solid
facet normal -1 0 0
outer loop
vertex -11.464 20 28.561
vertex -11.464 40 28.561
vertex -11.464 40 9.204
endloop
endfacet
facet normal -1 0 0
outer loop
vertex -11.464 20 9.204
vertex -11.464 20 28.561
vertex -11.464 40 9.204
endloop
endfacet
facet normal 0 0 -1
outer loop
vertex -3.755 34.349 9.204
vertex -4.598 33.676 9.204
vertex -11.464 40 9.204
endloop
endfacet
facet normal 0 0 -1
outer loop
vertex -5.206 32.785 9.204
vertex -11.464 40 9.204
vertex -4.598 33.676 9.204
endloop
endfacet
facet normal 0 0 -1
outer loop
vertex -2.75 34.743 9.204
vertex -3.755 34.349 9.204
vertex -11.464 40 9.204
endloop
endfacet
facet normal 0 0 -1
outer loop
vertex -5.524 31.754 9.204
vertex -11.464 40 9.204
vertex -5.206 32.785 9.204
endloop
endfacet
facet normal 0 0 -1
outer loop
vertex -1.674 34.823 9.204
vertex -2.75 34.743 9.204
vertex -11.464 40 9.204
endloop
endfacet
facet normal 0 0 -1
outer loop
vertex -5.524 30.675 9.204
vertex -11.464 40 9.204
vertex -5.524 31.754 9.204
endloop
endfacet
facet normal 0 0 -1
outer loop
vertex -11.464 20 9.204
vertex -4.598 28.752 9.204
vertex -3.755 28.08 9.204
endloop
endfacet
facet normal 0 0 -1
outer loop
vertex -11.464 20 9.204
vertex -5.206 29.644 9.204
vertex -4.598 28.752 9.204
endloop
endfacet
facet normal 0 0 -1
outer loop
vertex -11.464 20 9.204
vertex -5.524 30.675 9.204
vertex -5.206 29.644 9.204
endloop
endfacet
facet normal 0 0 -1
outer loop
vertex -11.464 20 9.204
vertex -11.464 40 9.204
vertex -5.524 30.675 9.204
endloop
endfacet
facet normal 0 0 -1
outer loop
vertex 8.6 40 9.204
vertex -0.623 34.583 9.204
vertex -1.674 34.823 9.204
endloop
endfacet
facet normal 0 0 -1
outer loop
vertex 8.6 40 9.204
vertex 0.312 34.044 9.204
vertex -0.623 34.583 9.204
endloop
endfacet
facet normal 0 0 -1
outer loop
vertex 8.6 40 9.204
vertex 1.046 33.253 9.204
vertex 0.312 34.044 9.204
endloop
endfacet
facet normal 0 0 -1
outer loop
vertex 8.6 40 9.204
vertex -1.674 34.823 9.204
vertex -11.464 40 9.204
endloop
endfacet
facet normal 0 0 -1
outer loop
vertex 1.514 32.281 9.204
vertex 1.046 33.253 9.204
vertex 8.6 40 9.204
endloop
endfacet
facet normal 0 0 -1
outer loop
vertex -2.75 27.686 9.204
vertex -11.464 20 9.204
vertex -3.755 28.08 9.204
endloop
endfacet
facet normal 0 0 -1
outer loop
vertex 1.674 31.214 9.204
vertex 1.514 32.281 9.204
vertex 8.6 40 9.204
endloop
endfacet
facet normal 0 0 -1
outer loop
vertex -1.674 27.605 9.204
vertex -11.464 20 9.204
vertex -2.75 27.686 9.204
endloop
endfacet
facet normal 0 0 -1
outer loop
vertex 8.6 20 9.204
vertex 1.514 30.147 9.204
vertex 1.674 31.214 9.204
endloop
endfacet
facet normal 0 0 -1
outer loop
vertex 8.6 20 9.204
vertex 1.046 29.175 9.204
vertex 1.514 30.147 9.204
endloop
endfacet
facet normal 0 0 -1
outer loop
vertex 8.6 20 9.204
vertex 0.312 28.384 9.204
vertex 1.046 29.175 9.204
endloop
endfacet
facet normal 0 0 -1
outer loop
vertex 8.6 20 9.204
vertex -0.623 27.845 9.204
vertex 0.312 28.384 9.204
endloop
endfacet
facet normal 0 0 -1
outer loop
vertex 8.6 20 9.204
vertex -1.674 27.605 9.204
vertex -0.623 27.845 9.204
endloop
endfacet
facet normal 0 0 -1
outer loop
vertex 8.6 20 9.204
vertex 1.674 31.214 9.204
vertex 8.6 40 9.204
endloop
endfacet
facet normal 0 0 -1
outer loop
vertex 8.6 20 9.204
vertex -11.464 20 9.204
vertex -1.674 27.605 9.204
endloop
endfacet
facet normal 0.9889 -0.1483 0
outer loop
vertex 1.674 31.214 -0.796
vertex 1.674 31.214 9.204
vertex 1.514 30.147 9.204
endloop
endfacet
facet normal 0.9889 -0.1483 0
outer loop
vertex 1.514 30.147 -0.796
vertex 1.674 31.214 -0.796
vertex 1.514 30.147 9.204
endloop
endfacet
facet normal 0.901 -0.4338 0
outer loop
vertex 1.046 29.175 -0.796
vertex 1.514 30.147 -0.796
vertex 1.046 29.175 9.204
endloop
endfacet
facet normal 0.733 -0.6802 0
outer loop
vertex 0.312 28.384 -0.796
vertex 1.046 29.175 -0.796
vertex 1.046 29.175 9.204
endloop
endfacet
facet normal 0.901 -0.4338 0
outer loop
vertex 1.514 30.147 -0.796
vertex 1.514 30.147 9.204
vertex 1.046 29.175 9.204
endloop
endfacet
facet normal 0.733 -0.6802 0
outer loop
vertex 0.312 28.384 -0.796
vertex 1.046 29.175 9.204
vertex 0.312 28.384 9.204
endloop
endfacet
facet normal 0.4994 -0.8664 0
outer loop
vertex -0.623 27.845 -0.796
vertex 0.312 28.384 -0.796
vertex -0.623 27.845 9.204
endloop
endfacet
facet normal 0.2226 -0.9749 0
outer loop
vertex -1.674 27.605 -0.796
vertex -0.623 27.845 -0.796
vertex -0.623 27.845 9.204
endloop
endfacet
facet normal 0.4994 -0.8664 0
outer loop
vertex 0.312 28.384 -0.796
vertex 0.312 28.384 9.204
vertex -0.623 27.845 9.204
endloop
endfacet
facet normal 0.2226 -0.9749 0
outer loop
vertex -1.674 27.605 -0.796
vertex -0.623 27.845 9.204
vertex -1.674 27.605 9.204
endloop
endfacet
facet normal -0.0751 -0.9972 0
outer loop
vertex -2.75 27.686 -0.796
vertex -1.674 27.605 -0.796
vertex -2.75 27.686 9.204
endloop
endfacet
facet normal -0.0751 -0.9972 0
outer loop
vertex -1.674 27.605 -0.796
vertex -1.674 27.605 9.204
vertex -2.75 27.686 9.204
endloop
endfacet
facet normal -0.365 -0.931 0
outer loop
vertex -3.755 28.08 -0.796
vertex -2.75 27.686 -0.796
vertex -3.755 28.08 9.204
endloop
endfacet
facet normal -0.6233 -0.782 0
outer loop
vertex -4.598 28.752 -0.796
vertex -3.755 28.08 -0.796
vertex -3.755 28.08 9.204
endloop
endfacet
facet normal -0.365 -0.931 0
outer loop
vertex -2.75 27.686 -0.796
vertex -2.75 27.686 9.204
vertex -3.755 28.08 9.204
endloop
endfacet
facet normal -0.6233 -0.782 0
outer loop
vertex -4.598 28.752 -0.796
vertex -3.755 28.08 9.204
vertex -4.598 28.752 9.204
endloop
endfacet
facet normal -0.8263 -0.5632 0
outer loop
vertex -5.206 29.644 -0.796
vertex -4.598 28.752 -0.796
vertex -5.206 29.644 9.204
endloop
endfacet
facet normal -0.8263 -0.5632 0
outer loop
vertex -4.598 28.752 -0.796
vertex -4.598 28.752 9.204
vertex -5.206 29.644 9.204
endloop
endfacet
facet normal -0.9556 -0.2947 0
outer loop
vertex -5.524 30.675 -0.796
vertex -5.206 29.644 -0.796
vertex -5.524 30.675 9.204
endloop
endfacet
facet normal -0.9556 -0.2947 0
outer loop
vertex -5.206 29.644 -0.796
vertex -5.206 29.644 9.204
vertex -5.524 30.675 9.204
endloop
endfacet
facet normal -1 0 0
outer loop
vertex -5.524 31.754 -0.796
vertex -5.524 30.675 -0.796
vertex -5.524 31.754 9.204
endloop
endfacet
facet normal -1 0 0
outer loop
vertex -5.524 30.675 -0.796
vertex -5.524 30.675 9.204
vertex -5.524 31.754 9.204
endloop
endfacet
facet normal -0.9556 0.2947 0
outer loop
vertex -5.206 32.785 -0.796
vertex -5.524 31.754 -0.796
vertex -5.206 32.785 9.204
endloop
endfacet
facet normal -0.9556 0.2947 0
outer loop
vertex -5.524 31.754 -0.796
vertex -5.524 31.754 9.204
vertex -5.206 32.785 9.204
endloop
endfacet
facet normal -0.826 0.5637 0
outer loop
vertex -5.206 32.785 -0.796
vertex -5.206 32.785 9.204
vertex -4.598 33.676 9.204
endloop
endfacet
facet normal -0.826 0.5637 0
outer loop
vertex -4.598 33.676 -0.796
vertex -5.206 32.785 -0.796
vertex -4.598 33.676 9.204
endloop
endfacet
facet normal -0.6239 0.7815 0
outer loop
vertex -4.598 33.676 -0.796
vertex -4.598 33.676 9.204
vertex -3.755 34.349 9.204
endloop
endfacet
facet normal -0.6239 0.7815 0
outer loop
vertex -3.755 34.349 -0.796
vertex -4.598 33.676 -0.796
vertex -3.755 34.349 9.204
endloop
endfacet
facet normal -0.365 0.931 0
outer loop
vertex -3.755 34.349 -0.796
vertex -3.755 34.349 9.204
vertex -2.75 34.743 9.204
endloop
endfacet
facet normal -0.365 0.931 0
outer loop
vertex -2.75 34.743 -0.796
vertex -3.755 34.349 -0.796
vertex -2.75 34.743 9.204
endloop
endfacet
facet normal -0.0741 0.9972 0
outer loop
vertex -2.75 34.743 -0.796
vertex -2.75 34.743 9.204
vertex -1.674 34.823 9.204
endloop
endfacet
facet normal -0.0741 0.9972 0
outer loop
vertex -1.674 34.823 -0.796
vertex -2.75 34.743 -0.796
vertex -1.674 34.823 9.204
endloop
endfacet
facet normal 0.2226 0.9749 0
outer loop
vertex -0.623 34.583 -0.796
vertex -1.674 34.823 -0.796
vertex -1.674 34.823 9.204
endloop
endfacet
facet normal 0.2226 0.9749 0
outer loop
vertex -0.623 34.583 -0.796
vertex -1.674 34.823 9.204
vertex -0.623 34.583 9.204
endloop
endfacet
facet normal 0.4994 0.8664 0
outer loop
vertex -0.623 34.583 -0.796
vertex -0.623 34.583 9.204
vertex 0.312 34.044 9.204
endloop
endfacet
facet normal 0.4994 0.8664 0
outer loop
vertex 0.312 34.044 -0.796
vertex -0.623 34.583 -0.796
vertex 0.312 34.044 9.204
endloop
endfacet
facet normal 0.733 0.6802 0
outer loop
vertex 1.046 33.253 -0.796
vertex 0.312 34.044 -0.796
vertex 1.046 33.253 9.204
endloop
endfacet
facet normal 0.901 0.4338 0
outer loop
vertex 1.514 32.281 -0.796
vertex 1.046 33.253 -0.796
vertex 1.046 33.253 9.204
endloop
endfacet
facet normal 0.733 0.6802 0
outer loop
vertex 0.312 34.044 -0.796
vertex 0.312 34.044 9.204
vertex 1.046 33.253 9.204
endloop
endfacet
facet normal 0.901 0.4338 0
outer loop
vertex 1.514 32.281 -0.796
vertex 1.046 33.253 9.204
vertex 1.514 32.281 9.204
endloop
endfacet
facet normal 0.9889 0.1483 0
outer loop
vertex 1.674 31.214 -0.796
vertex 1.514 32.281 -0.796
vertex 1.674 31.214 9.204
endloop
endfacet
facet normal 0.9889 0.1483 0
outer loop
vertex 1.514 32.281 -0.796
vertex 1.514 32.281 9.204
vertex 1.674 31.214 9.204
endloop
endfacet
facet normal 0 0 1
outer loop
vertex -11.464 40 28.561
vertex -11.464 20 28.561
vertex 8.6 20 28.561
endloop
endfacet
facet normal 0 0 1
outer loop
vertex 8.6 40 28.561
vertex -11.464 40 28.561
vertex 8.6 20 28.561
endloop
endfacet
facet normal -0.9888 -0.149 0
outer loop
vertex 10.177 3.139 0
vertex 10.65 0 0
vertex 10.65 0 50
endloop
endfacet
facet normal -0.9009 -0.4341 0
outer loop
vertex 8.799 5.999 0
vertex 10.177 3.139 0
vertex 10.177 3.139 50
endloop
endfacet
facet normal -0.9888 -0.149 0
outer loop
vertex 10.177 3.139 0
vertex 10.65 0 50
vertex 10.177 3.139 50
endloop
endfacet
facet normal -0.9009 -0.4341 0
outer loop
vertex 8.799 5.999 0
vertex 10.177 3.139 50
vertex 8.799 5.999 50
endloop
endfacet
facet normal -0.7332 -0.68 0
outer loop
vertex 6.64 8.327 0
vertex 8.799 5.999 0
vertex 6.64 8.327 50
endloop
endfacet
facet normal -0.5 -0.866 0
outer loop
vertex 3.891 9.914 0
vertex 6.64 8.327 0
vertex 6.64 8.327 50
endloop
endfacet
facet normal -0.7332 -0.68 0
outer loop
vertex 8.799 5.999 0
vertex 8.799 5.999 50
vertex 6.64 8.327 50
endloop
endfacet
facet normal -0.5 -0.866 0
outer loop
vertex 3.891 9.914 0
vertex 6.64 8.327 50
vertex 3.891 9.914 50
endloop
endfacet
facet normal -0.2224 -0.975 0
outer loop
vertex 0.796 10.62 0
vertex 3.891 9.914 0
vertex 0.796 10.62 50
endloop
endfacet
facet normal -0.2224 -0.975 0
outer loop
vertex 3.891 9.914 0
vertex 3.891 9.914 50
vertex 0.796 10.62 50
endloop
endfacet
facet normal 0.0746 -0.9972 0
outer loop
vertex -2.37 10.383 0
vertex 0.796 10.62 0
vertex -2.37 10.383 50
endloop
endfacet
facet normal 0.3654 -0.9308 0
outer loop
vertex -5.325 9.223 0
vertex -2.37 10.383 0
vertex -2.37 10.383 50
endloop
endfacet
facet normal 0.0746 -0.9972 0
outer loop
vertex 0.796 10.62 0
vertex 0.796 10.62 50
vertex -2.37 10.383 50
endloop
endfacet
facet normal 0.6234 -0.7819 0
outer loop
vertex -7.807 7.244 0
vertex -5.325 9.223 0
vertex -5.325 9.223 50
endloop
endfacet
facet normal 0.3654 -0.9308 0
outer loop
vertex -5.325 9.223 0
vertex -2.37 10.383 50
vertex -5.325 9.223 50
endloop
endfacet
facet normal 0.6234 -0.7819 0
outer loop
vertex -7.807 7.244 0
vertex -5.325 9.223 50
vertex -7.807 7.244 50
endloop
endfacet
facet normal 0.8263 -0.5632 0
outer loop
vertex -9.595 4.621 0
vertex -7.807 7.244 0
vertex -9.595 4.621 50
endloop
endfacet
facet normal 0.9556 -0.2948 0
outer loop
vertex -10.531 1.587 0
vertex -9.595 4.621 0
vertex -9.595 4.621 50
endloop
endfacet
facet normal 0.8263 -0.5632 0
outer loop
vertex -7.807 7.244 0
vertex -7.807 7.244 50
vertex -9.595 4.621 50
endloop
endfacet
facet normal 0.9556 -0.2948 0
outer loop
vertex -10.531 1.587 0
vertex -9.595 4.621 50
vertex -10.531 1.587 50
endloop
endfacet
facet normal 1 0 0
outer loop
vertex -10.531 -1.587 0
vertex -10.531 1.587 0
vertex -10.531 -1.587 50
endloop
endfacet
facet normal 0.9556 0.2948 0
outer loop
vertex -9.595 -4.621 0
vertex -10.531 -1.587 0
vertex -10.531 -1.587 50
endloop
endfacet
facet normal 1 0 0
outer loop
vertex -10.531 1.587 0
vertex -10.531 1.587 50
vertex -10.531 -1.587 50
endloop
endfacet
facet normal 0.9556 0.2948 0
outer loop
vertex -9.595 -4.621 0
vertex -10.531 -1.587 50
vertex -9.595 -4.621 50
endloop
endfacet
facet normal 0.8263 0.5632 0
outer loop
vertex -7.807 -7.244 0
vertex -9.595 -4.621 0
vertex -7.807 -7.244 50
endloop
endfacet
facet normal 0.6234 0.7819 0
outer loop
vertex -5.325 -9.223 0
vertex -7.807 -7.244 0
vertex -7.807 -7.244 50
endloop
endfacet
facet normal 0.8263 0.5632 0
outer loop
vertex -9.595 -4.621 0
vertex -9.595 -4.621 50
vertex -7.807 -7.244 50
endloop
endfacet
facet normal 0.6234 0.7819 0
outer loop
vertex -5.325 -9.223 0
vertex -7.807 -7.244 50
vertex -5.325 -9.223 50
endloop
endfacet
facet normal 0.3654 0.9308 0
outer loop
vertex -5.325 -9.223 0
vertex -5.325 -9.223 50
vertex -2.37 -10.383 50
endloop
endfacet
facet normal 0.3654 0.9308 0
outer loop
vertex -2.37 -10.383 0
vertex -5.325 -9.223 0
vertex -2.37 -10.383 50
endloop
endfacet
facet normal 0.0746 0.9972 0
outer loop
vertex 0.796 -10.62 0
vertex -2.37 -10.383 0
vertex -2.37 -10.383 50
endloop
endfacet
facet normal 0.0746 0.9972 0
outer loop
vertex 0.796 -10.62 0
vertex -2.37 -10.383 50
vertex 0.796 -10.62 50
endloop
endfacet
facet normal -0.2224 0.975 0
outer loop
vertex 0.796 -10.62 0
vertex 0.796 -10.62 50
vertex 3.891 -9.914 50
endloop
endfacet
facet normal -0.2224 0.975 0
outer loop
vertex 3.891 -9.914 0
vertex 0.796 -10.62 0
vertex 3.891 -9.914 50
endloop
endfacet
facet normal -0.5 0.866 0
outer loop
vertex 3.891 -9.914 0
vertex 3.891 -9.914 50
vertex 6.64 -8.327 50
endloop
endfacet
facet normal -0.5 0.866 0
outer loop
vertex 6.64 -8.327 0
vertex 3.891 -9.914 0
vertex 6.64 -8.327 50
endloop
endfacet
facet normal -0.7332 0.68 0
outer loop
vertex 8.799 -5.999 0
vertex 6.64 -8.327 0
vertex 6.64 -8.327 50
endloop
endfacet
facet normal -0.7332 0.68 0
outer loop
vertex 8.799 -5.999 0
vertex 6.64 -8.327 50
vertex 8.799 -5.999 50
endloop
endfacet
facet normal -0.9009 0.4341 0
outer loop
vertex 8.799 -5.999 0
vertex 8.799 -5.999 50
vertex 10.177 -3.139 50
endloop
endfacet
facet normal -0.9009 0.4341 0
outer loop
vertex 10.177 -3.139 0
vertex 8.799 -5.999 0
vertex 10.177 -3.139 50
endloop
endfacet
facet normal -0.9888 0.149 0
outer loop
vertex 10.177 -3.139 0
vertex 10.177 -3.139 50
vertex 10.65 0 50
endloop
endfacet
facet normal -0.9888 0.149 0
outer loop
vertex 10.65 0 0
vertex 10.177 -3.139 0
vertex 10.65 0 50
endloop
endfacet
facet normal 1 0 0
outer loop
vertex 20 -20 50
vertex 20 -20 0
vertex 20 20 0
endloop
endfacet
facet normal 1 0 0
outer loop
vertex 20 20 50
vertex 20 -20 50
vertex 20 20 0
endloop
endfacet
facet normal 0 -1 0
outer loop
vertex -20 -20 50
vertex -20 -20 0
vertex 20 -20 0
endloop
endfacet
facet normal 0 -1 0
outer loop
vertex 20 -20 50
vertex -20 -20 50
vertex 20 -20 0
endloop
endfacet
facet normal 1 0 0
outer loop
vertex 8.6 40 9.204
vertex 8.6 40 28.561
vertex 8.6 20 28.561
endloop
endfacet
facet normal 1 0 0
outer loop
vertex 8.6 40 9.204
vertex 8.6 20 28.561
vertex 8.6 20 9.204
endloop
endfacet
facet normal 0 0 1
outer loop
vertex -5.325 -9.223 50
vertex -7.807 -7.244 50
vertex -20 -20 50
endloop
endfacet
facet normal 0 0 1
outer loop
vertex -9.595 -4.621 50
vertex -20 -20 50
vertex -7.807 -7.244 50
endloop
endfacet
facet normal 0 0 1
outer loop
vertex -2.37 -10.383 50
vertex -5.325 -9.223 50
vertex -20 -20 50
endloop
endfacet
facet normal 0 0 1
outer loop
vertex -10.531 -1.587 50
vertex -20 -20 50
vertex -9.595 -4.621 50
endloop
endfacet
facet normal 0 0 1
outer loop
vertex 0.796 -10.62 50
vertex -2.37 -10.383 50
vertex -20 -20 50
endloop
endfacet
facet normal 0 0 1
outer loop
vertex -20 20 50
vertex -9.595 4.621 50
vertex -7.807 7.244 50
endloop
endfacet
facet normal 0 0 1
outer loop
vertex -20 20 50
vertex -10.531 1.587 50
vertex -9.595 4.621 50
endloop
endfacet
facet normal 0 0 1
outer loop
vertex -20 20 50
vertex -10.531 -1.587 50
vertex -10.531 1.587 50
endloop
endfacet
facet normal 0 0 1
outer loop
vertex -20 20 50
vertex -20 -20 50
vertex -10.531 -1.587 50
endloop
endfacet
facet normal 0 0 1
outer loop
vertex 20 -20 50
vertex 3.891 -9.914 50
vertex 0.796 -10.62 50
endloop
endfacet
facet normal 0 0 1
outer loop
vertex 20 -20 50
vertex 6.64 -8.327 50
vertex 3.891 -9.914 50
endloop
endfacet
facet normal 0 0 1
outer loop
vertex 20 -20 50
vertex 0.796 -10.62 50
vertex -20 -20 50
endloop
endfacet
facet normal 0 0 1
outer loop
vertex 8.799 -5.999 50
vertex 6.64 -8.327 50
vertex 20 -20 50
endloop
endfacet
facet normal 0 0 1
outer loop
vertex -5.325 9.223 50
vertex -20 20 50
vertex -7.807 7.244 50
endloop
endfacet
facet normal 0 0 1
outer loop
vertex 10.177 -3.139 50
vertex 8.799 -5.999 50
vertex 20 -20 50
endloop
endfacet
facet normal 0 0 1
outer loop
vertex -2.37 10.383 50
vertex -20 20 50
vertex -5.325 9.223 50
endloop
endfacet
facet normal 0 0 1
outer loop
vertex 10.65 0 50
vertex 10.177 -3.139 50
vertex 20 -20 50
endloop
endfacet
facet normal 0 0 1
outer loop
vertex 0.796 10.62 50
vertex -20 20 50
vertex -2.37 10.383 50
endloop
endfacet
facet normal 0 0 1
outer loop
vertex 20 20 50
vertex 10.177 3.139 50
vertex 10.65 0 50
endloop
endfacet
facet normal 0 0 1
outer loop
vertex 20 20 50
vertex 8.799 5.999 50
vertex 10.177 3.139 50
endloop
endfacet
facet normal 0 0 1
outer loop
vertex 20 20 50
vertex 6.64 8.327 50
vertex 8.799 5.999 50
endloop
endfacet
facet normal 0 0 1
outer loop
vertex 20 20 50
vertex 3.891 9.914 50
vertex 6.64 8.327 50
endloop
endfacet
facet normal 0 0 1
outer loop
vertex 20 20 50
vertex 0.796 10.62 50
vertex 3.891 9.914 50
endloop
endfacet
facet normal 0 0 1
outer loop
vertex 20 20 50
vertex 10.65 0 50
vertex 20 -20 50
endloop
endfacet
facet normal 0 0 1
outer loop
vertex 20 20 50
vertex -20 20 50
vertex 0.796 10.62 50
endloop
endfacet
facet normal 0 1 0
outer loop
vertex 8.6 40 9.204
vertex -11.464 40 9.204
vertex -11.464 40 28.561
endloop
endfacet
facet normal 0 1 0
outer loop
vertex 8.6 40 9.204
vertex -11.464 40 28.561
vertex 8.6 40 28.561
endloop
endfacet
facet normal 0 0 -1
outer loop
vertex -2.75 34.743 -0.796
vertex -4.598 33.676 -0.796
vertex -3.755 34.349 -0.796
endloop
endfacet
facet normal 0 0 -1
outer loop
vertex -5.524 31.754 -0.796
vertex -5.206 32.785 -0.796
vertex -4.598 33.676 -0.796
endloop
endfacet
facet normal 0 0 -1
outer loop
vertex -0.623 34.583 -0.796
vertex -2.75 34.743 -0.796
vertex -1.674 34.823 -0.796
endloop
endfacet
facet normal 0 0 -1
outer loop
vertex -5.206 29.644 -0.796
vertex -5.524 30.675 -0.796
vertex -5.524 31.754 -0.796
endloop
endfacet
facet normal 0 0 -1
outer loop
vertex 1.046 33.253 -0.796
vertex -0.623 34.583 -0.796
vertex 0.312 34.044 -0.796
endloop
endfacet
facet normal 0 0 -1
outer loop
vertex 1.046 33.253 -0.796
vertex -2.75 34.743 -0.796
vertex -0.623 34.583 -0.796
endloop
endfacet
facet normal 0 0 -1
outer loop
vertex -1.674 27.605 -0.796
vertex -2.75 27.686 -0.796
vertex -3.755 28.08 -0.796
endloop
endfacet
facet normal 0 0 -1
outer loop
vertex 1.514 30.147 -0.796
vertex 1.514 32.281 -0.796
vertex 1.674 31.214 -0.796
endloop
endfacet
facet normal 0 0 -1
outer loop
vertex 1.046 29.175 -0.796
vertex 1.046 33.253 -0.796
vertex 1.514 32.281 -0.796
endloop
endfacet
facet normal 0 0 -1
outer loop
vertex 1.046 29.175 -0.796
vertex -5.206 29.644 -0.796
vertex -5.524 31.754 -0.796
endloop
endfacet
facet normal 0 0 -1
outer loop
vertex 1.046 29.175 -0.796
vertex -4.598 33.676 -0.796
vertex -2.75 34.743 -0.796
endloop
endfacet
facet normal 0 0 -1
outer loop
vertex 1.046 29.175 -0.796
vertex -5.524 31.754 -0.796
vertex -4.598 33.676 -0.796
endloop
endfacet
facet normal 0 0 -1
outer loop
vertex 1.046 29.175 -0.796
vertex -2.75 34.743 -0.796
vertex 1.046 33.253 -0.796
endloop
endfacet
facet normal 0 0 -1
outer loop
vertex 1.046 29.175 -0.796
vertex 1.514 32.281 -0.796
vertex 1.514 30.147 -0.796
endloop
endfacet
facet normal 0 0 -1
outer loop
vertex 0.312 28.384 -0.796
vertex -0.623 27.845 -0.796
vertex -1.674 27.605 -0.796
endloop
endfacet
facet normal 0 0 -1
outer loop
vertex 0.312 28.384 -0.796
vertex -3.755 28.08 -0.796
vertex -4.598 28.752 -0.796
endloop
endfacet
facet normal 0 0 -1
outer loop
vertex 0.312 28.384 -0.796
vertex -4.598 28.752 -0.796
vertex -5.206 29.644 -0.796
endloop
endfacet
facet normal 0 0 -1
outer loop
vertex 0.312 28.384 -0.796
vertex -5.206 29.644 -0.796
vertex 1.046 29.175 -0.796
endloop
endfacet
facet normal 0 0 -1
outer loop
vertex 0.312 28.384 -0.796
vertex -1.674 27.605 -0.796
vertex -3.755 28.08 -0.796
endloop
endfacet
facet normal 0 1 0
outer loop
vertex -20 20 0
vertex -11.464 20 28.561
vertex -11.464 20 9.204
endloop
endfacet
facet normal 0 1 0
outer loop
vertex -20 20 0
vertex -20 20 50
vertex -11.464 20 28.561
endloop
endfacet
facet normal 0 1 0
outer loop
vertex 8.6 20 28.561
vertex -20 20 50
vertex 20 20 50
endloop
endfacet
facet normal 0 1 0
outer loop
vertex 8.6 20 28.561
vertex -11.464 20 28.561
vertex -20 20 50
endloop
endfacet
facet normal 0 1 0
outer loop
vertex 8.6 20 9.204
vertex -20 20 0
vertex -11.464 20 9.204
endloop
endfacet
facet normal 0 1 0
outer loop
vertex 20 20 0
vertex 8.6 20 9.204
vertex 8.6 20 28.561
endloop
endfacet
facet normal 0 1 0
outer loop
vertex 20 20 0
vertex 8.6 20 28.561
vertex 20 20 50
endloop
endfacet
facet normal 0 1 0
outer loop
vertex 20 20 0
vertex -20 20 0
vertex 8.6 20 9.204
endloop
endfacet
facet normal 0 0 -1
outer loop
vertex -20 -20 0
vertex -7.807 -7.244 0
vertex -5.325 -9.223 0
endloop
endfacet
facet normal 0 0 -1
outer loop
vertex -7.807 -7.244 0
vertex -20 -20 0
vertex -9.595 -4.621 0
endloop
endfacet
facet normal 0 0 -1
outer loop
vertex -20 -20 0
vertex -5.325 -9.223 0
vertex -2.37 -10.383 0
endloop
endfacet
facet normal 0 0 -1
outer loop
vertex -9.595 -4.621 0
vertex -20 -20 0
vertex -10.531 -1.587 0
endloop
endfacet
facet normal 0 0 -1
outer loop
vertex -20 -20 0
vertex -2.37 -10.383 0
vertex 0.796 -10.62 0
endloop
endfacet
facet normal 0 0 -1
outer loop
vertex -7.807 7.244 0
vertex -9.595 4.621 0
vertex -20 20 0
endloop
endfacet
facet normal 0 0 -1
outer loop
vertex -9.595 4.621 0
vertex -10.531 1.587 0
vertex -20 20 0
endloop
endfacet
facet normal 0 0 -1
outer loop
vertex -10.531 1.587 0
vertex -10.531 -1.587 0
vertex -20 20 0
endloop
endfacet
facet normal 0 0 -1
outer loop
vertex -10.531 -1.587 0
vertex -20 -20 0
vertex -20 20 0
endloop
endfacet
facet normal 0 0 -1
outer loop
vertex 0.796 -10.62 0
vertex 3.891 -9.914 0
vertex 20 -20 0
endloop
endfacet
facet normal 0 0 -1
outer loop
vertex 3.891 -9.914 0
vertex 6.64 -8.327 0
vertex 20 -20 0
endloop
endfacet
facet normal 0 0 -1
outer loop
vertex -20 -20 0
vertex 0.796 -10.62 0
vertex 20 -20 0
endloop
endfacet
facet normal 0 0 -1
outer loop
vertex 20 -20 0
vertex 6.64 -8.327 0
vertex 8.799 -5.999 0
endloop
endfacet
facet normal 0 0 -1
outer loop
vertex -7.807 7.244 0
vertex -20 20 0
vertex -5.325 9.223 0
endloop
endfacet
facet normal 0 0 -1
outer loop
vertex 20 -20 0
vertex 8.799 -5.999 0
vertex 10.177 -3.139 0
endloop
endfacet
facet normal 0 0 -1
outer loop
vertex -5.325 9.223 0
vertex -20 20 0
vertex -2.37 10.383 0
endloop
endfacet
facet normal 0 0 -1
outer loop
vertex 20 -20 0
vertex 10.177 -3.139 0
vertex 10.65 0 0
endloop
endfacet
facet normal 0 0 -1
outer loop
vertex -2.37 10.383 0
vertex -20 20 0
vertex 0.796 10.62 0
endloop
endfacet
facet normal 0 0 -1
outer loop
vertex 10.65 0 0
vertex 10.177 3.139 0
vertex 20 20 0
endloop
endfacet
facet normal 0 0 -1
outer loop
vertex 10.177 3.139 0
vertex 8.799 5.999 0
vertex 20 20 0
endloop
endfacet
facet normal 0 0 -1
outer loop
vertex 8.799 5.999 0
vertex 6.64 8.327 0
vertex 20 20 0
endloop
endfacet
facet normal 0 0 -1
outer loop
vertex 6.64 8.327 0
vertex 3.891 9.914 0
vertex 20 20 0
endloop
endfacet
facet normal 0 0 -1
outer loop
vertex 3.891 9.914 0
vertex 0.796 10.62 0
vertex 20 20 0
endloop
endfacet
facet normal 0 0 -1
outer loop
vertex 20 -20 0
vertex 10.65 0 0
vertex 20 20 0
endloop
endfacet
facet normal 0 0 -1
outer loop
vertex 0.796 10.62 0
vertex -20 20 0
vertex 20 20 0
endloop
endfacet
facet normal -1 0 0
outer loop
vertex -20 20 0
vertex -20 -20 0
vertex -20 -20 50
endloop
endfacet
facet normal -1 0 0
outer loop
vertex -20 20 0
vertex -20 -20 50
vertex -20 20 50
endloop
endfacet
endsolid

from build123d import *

# Parameters (mm, degrees)
SKETCH1_W           = 40
SKETCH1_H           = 40
BOSS_EXTRUDE1_DEPTH = 50
SKETCH2_R           = 10.65
CUT_EXTRUDE1_DEPTH  = 58.445626465
SKETCH3_W           = 20.063984789
SKETCH3_H           = 19.357087105
BOSS_EXTRUDE2_DEPTH = 20
SKETCH4_R           = 3.619370809
BOSS_EXTRUDE3_DEPTH = 10


with BuildPart() as part:
    # Sketch1 → Boss-Extrude1 (new body)
    with BuildSketch(Plane.XY):
        Rectangle(SKETCH1_W, SKETCH1_H)
    extrude(amount=BOSS_EXTRUDE1_DEPTH)

    # Sketch2 → Cut-Extrude1 (cut, through all)
    with BuildSketch(Plane.XY.offset(50)):
        Circle(SKETCH2_R)
    extrude(amount=-CUT_EXTRUDE1_DEPTH, mode=Mode.SUBTRACT)

    # Sketch3 → Boss-Extrude2 (add)
    with BuildSketch(Plane(origin=(0, 20, 0), x_dir=(1, 0, 0), z_dir=(0, 1, 0))):
        with Locations((-1.432326622, -18.882716681)):
            Rectangle(SKETCH3_W, SKETCH3_H)
    extrude(amount=BOSS_EXTRUDE2_DEPTH)

    # Sketch4 → Boss-Extrude3 (add)
    with BuildSketch(Plane(origin=(0, 0, 9.204173129), x_dir=(-1, 0, 0), z_dir=(0, 0, -1))):
        with Locations(Location((1.944917796, 31.214146172, 0), (0, 0, 180))):
            Circle(SKETCH4_R)
    extrude(amount=BOSS_EXTRUDE3_DEPTH)


solid = part.part
